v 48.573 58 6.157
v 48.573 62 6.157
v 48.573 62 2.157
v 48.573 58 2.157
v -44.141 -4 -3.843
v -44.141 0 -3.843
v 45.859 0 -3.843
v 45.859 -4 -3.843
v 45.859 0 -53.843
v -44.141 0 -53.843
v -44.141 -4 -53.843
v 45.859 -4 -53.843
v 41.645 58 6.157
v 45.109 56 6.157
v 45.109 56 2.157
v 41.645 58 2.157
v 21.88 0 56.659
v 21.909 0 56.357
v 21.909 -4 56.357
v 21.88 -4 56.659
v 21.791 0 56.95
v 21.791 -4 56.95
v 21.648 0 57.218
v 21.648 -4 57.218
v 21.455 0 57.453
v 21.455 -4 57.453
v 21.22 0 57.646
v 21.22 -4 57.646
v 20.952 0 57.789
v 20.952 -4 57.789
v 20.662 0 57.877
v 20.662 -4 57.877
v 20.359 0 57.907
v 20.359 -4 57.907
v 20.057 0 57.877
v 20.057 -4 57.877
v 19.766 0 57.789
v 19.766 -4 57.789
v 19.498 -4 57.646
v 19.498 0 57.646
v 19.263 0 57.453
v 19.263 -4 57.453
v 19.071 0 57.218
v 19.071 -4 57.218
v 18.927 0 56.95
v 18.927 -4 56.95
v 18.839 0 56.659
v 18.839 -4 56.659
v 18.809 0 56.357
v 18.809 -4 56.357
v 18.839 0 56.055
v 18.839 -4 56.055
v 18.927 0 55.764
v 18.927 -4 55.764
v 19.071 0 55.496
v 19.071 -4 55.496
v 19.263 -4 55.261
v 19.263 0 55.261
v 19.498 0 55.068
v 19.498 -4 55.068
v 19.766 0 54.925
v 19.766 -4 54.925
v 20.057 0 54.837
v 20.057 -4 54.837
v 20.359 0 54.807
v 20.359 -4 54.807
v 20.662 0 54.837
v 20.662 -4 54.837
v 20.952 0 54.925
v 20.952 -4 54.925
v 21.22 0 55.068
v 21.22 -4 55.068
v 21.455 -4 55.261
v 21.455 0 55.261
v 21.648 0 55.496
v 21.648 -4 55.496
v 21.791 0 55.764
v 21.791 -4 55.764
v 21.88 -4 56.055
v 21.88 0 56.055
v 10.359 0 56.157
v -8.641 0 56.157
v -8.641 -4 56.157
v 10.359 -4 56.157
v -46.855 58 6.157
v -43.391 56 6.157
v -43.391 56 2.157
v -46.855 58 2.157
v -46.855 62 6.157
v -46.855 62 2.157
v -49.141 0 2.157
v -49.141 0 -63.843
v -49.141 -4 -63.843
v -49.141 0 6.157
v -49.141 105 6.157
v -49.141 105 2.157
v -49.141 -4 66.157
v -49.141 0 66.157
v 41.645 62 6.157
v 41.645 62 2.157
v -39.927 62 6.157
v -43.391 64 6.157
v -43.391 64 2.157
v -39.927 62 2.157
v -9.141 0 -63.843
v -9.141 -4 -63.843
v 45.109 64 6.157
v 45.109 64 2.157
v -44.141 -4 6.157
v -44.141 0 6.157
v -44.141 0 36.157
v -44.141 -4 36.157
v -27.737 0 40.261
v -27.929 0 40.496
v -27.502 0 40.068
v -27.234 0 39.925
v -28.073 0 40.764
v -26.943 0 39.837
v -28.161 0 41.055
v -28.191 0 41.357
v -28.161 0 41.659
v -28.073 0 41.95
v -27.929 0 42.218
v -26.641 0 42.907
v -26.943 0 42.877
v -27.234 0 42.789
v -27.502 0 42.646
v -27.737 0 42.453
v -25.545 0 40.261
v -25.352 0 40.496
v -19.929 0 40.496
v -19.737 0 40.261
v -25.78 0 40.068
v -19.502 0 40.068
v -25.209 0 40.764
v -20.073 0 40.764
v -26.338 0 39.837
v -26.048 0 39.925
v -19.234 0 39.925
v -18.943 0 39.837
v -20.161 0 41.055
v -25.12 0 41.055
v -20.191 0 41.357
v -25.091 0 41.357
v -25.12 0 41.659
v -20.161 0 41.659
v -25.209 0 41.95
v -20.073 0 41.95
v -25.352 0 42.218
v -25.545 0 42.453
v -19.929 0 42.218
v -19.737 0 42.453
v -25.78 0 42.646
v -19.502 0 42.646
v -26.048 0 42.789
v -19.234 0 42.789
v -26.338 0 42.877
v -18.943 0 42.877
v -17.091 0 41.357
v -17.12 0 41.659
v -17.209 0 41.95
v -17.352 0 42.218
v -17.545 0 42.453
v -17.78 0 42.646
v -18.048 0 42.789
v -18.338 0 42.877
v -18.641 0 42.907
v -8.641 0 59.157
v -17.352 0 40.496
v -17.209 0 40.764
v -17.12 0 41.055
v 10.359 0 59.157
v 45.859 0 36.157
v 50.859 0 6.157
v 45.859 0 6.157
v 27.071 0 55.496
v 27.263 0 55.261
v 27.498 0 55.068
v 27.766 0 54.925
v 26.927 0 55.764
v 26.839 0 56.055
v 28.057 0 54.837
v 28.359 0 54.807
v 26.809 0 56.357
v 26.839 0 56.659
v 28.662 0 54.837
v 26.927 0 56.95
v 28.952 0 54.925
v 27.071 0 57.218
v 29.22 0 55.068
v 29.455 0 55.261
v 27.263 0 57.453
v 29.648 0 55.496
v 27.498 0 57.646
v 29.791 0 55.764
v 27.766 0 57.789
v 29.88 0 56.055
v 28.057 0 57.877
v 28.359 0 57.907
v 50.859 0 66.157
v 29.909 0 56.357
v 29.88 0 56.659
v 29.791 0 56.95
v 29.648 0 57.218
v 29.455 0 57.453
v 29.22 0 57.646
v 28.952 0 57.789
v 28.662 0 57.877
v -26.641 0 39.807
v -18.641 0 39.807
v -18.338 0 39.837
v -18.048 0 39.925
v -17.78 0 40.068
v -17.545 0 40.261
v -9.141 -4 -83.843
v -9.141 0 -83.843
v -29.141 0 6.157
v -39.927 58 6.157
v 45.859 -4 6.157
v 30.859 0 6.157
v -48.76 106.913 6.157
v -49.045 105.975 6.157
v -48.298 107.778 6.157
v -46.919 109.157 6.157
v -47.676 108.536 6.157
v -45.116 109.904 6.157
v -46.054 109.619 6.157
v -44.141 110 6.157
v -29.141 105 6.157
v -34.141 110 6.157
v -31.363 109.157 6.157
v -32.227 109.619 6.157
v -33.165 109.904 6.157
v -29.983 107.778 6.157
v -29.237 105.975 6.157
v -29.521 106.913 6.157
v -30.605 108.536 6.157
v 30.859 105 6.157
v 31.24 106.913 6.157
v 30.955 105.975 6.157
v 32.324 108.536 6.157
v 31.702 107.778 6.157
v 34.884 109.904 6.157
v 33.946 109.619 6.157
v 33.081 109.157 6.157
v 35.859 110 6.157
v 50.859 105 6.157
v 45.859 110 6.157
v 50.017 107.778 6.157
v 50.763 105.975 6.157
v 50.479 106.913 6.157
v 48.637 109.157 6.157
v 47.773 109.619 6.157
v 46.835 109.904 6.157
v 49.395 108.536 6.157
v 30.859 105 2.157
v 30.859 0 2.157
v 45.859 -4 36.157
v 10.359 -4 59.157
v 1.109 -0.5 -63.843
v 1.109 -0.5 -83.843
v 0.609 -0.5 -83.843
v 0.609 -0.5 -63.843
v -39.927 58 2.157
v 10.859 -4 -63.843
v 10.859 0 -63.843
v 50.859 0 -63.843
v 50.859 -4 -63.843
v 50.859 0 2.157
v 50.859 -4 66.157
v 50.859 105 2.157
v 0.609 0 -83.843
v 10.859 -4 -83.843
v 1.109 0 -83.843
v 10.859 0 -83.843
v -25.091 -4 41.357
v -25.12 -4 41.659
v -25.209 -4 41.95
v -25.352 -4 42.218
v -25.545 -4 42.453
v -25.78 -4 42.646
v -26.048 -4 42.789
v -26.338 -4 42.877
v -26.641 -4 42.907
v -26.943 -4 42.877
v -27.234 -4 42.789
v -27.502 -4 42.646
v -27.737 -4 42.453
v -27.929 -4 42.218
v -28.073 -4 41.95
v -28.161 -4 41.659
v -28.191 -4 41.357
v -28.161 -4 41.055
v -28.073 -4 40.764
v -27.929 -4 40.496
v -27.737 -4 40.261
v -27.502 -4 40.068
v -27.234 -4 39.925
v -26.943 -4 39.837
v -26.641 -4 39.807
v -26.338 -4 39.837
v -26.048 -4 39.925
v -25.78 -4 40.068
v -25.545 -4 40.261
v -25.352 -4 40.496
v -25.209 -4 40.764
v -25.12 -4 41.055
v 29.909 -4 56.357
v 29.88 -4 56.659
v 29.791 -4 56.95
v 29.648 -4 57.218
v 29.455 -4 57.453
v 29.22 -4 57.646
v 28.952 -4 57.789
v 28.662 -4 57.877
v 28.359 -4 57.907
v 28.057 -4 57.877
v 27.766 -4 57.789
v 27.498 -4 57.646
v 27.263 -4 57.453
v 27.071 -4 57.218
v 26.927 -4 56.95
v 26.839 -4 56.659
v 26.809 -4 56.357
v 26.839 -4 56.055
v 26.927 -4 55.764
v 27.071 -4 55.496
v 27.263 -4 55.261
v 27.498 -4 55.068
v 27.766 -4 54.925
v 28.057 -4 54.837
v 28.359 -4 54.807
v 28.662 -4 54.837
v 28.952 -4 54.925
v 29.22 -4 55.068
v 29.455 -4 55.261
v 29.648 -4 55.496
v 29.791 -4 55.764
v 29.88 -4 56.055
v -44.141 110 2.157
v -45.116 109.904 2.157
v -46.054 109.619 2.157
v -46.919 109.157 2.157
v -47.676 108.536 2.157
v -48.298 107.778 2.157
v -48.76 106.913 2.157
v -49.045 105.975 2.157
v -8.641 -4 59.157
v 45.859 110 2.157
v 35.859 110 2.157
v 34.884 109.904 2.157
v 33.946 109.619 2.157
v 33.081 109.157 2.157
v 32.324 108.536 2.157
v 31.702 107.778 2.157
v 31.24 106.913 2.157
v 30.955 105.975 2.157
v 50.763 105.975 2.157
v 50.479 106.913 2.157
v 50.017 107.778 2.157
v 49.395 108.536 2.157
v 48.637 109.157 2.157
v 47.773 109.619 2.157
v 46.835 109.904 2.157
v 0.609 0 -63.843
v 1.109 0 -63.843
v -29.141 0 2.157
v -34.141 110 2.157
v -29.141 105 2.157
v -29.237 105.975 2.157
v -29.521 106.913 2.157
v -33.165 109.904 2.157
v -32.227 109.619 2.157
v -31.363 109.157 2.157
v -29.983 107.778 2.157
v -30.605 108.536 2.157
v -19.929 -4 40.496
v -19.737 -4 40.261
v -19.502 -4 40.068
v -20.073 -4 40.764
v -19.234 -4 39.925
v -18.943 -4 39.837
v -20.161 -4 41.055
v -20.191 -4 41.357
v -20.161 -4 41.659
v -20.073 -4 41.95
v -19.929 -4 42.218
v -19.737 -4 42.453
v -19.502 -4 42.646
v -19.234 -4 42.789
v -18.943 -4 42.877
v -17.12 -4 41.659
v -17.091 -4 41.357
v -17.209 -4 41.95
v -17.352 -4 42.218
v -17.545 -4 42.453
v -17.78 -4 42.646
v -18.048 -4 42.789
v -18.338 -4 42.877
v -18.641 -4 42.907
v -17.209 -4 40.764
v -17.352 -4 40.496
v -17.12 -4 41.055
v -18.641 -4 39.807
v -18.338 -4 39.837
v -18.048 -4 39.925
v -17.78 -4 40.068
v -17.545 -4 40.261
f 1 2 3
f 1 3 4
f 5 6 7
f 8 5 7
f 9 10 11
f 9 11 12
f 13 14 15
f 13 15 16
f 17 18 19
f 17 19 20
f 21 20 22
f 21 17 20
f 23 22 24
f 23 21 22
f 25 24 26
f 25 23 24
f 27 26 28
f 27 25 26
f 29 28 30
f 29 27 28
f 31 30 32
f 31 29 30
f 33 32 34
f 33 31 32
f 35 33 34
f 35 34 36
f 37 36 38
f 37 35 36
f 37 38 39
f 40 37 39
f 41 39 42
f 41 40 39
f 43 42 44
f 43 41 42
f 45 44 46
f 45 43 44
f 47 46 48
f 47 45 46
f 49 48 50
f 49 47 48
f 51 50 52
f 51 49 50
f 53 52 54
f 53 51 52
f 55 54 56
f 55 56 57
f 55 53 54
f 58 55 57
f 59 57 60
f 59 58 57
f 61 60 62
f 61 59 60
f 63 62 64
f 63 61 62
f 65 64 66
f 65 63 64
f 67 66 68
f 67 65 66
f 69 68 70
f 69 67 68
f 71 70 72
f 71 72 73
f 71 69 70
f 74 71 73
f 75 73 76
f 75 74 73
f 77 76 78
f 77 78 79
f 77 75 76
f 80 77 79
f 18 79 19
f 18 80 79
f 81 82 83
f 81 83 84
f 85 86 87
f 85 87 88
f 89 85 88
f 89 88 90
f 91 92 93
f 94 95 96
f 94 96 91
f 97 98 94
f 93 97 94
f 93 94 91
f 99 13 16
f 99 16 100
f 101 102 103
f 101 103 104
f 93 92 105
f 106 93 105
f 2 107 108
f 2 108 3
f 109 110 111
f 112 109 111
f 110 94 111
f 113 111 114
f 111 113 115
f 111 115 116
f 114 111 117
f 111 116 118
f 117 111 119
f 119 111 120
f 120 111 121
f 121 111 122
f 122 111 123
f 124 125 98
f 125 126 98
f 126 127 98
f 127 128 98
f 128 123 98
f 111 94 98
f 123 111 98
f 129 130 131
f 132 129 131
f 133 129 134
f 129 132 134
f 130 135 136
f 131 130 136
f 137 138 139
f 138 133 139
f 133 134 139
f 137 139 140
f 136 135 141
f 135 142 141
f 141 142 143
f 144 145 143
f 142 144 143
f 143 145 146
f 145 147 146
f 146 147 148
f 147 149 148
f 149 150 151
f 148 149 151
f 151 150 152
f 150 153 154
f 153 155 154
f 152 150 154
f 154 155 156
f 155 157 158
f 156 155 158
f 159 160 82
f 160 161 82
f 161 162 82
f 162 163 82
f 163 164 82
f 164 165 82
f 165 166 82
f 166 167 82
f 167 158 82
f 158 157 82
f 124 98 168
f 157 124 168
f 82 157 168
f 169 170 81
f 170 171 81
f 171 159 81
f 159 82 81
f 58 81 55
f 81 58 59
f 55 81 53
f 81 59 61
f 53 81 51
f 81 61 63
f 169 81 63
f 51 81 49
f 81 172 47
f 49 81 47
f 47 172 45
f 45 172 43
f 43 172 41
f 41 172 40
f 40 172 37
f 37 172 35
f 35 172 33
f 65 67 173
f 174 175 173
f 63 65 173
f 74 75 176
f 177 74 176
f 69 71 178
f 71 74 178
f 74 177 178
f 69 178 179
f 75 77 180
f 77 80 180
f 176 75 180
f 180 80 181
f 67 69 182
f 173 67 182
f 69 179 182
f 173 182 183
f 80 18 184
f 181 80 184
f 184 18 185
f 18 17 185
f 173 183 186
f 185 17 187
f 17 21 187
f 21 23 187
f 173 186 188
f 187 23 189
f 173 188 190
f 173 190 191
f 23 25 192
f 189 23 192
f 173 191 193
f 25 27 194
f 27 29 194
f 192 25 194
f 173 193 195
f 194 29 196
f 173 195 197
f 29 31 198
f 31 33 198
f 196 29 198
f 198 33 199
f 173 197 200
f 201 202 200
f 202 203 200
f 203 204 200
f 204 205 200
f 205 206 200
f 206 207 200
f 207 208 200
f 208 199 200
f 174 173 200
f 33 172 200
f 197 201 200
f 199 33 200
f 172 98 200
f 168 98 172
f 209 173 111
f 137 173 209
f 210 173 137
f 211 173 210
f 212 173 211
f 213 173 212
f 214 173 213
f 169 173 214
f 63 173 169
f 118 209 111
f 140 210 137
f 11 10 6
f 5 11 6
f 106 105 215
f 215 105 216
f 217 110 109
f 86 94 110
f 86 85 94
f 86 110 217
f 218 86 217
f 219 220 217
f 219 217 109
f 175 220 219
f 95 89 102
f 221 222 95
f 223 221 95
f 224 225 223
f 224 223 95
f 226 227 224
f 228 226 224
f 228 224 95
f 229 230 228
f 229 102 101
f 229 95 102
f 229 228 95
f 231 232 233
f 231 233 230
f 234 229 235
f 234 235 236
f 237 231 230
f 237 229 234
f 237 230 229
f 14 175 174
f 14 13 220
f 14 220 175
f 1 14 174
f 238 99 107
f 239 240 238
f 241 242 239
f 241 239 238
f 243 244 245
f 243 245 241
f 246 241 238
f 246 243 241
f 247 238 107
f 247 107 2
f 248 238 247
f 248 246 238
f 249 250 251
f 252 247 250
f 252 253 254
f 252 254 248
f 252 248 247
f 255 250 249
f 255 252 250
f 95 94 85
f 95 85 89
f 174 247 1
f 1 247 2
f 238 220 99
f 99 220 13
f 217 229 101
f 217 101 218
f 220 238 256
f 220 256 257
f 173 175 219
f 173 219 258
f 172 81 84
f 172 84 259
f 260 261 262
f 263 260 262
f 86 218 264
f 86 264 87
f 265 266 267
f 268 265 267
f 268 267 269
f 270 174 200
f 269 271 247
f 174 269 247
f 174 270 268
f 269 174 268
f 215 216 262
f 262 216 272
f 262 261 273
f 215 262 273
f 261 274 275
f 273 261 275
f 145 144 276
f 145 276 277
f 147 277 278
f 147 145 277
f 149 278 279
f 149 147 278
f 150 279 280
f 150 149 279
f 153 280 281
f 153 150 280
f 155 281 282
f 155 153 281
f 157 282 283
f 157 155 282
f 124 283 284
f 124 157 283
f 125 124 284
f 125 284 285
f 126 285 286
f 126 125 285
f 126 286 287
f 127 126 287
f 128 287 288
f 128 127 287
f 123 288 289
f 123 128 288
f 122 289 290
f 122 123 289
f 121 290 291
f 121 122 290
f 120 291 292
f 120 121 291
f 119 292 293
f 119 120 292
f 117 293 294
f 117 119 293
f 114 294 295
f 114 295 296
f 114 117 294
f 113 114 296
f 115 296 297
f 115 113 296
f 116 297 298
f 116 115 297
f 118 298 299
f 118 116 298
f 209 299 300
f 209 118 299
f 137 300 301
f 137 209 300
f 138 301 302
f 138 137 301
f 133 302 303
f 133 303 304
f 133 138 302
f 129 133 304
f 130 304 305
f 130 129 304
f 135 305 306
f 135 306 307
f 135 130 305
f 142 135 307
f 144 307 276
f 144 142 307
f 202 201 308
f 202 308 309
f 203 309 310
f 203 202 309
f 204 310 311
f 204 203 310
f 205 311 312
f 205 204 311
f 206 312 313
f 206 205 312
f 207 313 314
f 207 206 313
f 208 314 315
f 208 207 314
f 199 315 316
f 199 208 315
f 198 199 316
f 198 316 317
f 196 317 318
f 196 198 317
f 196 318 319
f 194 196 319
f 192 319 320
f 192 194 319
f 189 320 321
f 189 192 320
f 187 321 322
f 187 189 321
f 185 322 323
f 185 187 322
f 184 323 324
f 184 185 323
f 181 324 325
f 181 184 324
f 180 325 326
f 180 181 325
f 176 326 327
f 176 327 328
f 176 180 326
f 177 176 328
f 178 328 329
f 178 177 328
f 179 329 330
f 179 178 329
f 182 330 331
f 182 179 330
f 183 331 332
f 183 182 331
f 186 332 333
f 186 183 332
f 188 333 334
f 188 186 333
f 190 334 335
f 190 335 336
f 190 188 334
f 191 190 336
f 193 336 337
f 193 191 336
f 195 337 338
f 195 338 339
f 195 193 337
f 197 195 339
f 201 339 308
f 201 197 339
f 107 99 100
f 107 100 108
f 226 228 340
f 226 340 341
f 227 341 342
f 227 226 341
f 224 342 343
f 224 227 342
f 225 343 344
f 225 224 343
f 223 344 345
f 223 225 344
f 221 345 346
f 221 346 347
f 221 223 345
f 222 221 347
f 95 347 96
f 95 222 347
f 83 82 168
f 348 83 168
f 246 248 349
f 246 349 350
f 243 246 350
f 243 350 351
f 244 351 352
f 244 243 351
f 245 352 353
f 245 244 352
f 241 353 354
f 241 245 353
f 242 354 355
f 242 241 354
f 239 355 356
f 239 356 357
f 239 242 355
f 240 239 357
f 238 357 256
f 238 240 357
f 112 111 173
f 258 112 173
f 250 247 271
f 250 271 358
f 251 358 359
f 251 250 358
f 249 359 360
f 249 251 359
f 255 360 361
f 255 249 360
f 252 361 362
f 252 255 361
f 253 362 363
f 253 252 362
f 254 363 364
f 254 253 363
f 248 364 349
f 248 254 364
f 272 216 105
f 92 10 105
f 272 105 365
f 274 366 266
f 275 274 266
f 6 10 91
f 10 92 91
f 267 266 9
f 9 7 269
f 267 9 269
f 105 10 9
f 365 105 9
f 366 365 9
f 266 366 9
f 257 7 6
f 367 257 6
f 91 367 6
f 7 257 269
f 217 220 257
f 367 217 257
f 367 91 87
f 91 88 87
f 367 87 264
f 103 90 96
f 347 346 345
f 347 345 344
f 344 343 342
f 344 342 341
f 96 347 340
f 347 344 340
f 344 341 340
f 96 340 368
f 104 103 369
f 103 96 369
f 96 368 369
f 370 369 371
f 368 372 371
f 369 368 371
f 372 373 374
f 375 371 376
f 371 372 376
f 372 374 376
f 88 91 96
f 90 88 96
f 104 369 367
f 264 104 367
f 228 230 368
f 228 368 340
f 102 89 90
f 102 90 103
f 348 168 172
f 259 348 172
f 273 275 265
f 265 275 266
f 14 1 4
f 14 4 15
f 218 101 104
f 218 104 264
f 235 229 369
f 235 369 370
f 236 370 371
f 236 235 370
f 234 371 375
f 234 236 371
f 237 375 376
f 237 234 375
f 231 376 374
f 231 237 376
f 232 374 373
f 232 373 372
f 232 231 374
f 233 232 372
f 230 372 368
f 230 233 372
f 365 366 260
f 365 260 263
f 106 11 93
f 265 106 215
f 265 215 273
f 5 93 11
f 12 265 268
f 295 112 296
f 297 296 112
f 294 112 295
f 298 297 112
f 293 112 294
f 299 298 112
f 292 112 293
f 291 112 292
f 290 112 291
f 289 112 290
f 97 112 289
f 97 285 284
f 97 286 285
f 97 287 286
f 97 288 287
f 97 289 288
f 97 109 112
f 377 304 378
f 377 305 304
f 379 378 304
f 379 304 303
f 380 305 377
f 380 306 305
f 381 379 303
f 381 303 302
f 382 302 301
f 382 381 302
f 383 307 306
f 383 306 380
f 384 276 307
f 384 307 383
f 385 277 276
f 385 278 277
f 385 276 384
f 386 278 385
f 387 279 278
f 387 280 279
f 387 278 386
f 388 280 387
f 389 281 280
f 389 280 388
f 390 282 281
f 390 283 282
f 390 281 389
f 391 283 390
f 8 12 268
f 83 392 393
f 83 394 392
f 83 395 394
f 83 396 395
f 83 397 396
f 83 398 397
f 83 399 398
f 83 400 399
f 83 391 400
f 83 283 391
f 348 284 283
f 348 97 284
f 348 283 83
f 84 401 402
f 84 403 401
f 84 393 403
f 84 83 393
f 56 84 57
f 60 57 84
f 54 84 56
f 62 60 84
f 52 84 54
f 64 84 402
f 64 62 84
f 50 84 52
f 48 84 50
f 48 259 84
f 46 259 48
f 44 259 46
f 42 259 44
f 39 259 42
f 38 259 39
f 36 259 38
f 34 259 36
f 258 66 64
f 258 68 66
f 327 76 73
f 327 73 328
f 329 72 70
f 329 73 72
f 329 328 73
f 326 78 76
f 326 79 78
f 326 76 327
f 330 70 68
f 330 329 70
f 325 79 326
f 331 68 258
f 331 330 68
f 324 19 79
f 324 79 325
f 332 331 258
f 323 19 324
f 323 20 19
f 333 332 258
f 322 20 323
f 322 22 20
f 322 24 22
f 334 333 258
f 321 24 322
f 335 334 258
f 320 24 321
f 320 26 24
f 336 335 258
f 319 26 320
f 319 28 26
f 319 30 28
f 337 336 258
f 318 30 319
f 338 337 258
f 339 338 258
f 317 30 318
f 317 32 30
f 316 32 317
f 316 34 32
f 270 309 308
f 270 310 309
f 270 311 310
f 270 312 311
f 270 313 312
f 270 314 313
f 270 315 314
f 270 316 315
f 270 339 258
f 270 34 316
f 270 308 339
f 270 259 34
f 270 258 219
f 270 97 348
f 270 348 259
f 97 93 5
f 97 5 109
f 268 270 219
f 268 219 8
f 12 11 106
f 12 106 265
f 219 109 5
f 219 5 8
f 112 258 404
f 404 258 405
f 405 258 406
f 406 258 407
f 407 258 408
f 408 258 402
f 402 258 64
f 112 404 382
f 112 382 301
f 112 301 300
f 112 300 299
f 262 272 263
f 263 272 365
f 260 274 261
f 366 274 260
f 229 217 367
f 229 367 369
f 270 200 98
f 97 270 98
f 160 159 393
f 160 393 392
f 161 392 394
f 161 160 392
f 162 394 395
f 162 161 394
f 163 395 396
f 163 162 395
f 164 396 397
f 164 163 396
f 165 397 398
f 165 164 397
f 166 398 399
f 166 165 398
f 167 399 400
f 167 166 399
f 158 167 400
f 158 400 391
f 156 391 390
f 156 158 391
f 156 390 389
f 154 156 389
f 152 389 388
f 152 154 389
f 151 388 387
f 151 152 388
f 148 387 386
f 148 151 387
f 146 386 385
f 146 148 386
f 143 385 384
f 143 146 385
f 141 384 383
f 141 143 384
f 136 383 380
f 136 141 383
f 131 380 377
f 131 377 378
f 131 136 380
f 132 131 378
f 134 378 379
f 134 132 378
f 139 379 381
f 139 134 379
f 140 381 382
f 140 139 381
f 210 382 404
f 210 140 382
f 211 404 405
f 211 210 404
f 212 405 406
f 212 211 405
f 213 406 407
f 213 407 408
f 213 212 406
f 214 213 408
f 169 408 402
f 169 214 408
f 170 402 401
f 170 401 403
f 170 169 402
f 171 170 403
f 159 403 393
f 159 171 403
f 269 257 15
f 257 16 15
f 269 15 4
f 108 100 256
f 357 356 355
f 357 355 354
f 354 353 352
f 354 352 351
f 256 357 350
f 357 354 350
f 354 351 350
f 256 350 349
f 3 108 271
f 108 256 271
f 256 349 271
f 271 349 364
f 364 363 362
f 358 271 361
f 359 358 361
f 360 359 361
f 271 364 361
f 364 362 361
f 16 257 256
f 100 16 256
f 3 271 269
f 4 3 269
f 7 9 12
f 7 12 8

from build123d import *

# Parameters (mm, degrees)
F0_W     = 90
F0_H     = 50
F0_H_2   = 30
F0_R     = 1.55
F0_W_2   = 19
F0_H_3   = 3
F1_DEPTH = 4
F3_DEPTH = 4
F4_W     = 0.5
F4_H     = 20
F5_DEPTH = 0.5


with BuildPart() as f1:
    # F0 (on Front) → F1 (new body)
    with BuildSketch(Plane.XZ):
        Polygon((50.859297, 66.157015), (-49.140703, 66.157015), (-49.140703, -63.842985), (-9.140703, -63.842985), (-9.140703, -83.842985), (10.859297, -83.842985), (10.859297, -63.842985), (50.859297, -63.842985), align=None)
        with Locations((0.859297, -28.842985)):
            Rectangle(F0_W, F0_H, mode=Mode.SUBTRACT)
        with Locations((0.859297, 21.157015)):
            Rectangle(F0_W, F0_H_2, mode=Mode.SUBTRACT)
        with Locations((-26.640703, 41.357015)):
            Circle(F0_R, mode=Mode.SUBTRACT)
        with Locations((-18.640703, 41.357015)):
            Circle(F0_R, mode=Mode.SUBTRACT)
        with Locations((0.859297, 57.657015)):
            Rectangle(F0_W_2, F0_H_3, mode=Mode.SUBTRACT)
        with Locations((20.359297, 56.357015)):
            Circle(F0_R, mode=Mode.SUBTRACT)
        with Locations((28.359297, 56.357015)):
            Circle(F0_R, mode=Mode.SUBTRACT)
    extrude(amount=F1_DEPTH)

    # F2 (on face) → F3 (join)
    with BuildSketch(Plane.XY.offset(6.157015)):
        with BuildLine():
            Line((-49.140703, 105), (-49.140703, 0))
            Line((-49.140703, 0), (-29.140703, 0))
            Line((-29.140703, 0), (-29.140703, 105))
            ThreePointArc((-29.140703, 105), (-30.605169, 108.535534), (-34.140703, 110))
            Line((-34.140703, 110), (-44.140703, 110))
            ThreePointArc((-44.140703, 110), (-47.676237, 108.535534), (-49.140703, 105))
        make_face()
        Polygon((-46.854805, 62), (-43.390703, 64), (-39.926602, 62), (-39.926602, 58), (-43.390703, 56), (-46.854805, 58), align=None, mode=Mode.SUBTRACT)
        with BuildLine():
            Line((30.859297, 105), (30.859297, 0))
            Line((30.859297, 0), (50.859297, 0))
            Line((50.859297, 0), (50.859297, 105))
            ThreePointArc((50.859297, 105), (49.394831, 108.535534), (45.859297, 110))
            Line((45.859297, 110), (35.859297, 110))
            ThreePointArc((35.859297, 110), (32.323763, 108.535534), (30.859297, 105))
        make_face()
        Polygon((45.109297, 64), (48.573398, 62), (48.573398, 58), (45.109297, 56), (41.645195, 58), (41.645195, 62), align=None, mode=Mode.SUBTRACT)
    extrude(amount=-F3_DEPTH)

    # F4 (on face) → F5 (cut)
    with BuildSketch(Plane(origin=(0, 0, 0), x_dir=(-1, 0, 0), z_dir=(0, 1, 0))):
        with Locations((-0.859297, -73.842985)):
            Rectangle(F4_W, F4_H)
    extrude(amount=-F5_DEPTH, mode=Mode.SUBTRACT)


solid = f1.part
